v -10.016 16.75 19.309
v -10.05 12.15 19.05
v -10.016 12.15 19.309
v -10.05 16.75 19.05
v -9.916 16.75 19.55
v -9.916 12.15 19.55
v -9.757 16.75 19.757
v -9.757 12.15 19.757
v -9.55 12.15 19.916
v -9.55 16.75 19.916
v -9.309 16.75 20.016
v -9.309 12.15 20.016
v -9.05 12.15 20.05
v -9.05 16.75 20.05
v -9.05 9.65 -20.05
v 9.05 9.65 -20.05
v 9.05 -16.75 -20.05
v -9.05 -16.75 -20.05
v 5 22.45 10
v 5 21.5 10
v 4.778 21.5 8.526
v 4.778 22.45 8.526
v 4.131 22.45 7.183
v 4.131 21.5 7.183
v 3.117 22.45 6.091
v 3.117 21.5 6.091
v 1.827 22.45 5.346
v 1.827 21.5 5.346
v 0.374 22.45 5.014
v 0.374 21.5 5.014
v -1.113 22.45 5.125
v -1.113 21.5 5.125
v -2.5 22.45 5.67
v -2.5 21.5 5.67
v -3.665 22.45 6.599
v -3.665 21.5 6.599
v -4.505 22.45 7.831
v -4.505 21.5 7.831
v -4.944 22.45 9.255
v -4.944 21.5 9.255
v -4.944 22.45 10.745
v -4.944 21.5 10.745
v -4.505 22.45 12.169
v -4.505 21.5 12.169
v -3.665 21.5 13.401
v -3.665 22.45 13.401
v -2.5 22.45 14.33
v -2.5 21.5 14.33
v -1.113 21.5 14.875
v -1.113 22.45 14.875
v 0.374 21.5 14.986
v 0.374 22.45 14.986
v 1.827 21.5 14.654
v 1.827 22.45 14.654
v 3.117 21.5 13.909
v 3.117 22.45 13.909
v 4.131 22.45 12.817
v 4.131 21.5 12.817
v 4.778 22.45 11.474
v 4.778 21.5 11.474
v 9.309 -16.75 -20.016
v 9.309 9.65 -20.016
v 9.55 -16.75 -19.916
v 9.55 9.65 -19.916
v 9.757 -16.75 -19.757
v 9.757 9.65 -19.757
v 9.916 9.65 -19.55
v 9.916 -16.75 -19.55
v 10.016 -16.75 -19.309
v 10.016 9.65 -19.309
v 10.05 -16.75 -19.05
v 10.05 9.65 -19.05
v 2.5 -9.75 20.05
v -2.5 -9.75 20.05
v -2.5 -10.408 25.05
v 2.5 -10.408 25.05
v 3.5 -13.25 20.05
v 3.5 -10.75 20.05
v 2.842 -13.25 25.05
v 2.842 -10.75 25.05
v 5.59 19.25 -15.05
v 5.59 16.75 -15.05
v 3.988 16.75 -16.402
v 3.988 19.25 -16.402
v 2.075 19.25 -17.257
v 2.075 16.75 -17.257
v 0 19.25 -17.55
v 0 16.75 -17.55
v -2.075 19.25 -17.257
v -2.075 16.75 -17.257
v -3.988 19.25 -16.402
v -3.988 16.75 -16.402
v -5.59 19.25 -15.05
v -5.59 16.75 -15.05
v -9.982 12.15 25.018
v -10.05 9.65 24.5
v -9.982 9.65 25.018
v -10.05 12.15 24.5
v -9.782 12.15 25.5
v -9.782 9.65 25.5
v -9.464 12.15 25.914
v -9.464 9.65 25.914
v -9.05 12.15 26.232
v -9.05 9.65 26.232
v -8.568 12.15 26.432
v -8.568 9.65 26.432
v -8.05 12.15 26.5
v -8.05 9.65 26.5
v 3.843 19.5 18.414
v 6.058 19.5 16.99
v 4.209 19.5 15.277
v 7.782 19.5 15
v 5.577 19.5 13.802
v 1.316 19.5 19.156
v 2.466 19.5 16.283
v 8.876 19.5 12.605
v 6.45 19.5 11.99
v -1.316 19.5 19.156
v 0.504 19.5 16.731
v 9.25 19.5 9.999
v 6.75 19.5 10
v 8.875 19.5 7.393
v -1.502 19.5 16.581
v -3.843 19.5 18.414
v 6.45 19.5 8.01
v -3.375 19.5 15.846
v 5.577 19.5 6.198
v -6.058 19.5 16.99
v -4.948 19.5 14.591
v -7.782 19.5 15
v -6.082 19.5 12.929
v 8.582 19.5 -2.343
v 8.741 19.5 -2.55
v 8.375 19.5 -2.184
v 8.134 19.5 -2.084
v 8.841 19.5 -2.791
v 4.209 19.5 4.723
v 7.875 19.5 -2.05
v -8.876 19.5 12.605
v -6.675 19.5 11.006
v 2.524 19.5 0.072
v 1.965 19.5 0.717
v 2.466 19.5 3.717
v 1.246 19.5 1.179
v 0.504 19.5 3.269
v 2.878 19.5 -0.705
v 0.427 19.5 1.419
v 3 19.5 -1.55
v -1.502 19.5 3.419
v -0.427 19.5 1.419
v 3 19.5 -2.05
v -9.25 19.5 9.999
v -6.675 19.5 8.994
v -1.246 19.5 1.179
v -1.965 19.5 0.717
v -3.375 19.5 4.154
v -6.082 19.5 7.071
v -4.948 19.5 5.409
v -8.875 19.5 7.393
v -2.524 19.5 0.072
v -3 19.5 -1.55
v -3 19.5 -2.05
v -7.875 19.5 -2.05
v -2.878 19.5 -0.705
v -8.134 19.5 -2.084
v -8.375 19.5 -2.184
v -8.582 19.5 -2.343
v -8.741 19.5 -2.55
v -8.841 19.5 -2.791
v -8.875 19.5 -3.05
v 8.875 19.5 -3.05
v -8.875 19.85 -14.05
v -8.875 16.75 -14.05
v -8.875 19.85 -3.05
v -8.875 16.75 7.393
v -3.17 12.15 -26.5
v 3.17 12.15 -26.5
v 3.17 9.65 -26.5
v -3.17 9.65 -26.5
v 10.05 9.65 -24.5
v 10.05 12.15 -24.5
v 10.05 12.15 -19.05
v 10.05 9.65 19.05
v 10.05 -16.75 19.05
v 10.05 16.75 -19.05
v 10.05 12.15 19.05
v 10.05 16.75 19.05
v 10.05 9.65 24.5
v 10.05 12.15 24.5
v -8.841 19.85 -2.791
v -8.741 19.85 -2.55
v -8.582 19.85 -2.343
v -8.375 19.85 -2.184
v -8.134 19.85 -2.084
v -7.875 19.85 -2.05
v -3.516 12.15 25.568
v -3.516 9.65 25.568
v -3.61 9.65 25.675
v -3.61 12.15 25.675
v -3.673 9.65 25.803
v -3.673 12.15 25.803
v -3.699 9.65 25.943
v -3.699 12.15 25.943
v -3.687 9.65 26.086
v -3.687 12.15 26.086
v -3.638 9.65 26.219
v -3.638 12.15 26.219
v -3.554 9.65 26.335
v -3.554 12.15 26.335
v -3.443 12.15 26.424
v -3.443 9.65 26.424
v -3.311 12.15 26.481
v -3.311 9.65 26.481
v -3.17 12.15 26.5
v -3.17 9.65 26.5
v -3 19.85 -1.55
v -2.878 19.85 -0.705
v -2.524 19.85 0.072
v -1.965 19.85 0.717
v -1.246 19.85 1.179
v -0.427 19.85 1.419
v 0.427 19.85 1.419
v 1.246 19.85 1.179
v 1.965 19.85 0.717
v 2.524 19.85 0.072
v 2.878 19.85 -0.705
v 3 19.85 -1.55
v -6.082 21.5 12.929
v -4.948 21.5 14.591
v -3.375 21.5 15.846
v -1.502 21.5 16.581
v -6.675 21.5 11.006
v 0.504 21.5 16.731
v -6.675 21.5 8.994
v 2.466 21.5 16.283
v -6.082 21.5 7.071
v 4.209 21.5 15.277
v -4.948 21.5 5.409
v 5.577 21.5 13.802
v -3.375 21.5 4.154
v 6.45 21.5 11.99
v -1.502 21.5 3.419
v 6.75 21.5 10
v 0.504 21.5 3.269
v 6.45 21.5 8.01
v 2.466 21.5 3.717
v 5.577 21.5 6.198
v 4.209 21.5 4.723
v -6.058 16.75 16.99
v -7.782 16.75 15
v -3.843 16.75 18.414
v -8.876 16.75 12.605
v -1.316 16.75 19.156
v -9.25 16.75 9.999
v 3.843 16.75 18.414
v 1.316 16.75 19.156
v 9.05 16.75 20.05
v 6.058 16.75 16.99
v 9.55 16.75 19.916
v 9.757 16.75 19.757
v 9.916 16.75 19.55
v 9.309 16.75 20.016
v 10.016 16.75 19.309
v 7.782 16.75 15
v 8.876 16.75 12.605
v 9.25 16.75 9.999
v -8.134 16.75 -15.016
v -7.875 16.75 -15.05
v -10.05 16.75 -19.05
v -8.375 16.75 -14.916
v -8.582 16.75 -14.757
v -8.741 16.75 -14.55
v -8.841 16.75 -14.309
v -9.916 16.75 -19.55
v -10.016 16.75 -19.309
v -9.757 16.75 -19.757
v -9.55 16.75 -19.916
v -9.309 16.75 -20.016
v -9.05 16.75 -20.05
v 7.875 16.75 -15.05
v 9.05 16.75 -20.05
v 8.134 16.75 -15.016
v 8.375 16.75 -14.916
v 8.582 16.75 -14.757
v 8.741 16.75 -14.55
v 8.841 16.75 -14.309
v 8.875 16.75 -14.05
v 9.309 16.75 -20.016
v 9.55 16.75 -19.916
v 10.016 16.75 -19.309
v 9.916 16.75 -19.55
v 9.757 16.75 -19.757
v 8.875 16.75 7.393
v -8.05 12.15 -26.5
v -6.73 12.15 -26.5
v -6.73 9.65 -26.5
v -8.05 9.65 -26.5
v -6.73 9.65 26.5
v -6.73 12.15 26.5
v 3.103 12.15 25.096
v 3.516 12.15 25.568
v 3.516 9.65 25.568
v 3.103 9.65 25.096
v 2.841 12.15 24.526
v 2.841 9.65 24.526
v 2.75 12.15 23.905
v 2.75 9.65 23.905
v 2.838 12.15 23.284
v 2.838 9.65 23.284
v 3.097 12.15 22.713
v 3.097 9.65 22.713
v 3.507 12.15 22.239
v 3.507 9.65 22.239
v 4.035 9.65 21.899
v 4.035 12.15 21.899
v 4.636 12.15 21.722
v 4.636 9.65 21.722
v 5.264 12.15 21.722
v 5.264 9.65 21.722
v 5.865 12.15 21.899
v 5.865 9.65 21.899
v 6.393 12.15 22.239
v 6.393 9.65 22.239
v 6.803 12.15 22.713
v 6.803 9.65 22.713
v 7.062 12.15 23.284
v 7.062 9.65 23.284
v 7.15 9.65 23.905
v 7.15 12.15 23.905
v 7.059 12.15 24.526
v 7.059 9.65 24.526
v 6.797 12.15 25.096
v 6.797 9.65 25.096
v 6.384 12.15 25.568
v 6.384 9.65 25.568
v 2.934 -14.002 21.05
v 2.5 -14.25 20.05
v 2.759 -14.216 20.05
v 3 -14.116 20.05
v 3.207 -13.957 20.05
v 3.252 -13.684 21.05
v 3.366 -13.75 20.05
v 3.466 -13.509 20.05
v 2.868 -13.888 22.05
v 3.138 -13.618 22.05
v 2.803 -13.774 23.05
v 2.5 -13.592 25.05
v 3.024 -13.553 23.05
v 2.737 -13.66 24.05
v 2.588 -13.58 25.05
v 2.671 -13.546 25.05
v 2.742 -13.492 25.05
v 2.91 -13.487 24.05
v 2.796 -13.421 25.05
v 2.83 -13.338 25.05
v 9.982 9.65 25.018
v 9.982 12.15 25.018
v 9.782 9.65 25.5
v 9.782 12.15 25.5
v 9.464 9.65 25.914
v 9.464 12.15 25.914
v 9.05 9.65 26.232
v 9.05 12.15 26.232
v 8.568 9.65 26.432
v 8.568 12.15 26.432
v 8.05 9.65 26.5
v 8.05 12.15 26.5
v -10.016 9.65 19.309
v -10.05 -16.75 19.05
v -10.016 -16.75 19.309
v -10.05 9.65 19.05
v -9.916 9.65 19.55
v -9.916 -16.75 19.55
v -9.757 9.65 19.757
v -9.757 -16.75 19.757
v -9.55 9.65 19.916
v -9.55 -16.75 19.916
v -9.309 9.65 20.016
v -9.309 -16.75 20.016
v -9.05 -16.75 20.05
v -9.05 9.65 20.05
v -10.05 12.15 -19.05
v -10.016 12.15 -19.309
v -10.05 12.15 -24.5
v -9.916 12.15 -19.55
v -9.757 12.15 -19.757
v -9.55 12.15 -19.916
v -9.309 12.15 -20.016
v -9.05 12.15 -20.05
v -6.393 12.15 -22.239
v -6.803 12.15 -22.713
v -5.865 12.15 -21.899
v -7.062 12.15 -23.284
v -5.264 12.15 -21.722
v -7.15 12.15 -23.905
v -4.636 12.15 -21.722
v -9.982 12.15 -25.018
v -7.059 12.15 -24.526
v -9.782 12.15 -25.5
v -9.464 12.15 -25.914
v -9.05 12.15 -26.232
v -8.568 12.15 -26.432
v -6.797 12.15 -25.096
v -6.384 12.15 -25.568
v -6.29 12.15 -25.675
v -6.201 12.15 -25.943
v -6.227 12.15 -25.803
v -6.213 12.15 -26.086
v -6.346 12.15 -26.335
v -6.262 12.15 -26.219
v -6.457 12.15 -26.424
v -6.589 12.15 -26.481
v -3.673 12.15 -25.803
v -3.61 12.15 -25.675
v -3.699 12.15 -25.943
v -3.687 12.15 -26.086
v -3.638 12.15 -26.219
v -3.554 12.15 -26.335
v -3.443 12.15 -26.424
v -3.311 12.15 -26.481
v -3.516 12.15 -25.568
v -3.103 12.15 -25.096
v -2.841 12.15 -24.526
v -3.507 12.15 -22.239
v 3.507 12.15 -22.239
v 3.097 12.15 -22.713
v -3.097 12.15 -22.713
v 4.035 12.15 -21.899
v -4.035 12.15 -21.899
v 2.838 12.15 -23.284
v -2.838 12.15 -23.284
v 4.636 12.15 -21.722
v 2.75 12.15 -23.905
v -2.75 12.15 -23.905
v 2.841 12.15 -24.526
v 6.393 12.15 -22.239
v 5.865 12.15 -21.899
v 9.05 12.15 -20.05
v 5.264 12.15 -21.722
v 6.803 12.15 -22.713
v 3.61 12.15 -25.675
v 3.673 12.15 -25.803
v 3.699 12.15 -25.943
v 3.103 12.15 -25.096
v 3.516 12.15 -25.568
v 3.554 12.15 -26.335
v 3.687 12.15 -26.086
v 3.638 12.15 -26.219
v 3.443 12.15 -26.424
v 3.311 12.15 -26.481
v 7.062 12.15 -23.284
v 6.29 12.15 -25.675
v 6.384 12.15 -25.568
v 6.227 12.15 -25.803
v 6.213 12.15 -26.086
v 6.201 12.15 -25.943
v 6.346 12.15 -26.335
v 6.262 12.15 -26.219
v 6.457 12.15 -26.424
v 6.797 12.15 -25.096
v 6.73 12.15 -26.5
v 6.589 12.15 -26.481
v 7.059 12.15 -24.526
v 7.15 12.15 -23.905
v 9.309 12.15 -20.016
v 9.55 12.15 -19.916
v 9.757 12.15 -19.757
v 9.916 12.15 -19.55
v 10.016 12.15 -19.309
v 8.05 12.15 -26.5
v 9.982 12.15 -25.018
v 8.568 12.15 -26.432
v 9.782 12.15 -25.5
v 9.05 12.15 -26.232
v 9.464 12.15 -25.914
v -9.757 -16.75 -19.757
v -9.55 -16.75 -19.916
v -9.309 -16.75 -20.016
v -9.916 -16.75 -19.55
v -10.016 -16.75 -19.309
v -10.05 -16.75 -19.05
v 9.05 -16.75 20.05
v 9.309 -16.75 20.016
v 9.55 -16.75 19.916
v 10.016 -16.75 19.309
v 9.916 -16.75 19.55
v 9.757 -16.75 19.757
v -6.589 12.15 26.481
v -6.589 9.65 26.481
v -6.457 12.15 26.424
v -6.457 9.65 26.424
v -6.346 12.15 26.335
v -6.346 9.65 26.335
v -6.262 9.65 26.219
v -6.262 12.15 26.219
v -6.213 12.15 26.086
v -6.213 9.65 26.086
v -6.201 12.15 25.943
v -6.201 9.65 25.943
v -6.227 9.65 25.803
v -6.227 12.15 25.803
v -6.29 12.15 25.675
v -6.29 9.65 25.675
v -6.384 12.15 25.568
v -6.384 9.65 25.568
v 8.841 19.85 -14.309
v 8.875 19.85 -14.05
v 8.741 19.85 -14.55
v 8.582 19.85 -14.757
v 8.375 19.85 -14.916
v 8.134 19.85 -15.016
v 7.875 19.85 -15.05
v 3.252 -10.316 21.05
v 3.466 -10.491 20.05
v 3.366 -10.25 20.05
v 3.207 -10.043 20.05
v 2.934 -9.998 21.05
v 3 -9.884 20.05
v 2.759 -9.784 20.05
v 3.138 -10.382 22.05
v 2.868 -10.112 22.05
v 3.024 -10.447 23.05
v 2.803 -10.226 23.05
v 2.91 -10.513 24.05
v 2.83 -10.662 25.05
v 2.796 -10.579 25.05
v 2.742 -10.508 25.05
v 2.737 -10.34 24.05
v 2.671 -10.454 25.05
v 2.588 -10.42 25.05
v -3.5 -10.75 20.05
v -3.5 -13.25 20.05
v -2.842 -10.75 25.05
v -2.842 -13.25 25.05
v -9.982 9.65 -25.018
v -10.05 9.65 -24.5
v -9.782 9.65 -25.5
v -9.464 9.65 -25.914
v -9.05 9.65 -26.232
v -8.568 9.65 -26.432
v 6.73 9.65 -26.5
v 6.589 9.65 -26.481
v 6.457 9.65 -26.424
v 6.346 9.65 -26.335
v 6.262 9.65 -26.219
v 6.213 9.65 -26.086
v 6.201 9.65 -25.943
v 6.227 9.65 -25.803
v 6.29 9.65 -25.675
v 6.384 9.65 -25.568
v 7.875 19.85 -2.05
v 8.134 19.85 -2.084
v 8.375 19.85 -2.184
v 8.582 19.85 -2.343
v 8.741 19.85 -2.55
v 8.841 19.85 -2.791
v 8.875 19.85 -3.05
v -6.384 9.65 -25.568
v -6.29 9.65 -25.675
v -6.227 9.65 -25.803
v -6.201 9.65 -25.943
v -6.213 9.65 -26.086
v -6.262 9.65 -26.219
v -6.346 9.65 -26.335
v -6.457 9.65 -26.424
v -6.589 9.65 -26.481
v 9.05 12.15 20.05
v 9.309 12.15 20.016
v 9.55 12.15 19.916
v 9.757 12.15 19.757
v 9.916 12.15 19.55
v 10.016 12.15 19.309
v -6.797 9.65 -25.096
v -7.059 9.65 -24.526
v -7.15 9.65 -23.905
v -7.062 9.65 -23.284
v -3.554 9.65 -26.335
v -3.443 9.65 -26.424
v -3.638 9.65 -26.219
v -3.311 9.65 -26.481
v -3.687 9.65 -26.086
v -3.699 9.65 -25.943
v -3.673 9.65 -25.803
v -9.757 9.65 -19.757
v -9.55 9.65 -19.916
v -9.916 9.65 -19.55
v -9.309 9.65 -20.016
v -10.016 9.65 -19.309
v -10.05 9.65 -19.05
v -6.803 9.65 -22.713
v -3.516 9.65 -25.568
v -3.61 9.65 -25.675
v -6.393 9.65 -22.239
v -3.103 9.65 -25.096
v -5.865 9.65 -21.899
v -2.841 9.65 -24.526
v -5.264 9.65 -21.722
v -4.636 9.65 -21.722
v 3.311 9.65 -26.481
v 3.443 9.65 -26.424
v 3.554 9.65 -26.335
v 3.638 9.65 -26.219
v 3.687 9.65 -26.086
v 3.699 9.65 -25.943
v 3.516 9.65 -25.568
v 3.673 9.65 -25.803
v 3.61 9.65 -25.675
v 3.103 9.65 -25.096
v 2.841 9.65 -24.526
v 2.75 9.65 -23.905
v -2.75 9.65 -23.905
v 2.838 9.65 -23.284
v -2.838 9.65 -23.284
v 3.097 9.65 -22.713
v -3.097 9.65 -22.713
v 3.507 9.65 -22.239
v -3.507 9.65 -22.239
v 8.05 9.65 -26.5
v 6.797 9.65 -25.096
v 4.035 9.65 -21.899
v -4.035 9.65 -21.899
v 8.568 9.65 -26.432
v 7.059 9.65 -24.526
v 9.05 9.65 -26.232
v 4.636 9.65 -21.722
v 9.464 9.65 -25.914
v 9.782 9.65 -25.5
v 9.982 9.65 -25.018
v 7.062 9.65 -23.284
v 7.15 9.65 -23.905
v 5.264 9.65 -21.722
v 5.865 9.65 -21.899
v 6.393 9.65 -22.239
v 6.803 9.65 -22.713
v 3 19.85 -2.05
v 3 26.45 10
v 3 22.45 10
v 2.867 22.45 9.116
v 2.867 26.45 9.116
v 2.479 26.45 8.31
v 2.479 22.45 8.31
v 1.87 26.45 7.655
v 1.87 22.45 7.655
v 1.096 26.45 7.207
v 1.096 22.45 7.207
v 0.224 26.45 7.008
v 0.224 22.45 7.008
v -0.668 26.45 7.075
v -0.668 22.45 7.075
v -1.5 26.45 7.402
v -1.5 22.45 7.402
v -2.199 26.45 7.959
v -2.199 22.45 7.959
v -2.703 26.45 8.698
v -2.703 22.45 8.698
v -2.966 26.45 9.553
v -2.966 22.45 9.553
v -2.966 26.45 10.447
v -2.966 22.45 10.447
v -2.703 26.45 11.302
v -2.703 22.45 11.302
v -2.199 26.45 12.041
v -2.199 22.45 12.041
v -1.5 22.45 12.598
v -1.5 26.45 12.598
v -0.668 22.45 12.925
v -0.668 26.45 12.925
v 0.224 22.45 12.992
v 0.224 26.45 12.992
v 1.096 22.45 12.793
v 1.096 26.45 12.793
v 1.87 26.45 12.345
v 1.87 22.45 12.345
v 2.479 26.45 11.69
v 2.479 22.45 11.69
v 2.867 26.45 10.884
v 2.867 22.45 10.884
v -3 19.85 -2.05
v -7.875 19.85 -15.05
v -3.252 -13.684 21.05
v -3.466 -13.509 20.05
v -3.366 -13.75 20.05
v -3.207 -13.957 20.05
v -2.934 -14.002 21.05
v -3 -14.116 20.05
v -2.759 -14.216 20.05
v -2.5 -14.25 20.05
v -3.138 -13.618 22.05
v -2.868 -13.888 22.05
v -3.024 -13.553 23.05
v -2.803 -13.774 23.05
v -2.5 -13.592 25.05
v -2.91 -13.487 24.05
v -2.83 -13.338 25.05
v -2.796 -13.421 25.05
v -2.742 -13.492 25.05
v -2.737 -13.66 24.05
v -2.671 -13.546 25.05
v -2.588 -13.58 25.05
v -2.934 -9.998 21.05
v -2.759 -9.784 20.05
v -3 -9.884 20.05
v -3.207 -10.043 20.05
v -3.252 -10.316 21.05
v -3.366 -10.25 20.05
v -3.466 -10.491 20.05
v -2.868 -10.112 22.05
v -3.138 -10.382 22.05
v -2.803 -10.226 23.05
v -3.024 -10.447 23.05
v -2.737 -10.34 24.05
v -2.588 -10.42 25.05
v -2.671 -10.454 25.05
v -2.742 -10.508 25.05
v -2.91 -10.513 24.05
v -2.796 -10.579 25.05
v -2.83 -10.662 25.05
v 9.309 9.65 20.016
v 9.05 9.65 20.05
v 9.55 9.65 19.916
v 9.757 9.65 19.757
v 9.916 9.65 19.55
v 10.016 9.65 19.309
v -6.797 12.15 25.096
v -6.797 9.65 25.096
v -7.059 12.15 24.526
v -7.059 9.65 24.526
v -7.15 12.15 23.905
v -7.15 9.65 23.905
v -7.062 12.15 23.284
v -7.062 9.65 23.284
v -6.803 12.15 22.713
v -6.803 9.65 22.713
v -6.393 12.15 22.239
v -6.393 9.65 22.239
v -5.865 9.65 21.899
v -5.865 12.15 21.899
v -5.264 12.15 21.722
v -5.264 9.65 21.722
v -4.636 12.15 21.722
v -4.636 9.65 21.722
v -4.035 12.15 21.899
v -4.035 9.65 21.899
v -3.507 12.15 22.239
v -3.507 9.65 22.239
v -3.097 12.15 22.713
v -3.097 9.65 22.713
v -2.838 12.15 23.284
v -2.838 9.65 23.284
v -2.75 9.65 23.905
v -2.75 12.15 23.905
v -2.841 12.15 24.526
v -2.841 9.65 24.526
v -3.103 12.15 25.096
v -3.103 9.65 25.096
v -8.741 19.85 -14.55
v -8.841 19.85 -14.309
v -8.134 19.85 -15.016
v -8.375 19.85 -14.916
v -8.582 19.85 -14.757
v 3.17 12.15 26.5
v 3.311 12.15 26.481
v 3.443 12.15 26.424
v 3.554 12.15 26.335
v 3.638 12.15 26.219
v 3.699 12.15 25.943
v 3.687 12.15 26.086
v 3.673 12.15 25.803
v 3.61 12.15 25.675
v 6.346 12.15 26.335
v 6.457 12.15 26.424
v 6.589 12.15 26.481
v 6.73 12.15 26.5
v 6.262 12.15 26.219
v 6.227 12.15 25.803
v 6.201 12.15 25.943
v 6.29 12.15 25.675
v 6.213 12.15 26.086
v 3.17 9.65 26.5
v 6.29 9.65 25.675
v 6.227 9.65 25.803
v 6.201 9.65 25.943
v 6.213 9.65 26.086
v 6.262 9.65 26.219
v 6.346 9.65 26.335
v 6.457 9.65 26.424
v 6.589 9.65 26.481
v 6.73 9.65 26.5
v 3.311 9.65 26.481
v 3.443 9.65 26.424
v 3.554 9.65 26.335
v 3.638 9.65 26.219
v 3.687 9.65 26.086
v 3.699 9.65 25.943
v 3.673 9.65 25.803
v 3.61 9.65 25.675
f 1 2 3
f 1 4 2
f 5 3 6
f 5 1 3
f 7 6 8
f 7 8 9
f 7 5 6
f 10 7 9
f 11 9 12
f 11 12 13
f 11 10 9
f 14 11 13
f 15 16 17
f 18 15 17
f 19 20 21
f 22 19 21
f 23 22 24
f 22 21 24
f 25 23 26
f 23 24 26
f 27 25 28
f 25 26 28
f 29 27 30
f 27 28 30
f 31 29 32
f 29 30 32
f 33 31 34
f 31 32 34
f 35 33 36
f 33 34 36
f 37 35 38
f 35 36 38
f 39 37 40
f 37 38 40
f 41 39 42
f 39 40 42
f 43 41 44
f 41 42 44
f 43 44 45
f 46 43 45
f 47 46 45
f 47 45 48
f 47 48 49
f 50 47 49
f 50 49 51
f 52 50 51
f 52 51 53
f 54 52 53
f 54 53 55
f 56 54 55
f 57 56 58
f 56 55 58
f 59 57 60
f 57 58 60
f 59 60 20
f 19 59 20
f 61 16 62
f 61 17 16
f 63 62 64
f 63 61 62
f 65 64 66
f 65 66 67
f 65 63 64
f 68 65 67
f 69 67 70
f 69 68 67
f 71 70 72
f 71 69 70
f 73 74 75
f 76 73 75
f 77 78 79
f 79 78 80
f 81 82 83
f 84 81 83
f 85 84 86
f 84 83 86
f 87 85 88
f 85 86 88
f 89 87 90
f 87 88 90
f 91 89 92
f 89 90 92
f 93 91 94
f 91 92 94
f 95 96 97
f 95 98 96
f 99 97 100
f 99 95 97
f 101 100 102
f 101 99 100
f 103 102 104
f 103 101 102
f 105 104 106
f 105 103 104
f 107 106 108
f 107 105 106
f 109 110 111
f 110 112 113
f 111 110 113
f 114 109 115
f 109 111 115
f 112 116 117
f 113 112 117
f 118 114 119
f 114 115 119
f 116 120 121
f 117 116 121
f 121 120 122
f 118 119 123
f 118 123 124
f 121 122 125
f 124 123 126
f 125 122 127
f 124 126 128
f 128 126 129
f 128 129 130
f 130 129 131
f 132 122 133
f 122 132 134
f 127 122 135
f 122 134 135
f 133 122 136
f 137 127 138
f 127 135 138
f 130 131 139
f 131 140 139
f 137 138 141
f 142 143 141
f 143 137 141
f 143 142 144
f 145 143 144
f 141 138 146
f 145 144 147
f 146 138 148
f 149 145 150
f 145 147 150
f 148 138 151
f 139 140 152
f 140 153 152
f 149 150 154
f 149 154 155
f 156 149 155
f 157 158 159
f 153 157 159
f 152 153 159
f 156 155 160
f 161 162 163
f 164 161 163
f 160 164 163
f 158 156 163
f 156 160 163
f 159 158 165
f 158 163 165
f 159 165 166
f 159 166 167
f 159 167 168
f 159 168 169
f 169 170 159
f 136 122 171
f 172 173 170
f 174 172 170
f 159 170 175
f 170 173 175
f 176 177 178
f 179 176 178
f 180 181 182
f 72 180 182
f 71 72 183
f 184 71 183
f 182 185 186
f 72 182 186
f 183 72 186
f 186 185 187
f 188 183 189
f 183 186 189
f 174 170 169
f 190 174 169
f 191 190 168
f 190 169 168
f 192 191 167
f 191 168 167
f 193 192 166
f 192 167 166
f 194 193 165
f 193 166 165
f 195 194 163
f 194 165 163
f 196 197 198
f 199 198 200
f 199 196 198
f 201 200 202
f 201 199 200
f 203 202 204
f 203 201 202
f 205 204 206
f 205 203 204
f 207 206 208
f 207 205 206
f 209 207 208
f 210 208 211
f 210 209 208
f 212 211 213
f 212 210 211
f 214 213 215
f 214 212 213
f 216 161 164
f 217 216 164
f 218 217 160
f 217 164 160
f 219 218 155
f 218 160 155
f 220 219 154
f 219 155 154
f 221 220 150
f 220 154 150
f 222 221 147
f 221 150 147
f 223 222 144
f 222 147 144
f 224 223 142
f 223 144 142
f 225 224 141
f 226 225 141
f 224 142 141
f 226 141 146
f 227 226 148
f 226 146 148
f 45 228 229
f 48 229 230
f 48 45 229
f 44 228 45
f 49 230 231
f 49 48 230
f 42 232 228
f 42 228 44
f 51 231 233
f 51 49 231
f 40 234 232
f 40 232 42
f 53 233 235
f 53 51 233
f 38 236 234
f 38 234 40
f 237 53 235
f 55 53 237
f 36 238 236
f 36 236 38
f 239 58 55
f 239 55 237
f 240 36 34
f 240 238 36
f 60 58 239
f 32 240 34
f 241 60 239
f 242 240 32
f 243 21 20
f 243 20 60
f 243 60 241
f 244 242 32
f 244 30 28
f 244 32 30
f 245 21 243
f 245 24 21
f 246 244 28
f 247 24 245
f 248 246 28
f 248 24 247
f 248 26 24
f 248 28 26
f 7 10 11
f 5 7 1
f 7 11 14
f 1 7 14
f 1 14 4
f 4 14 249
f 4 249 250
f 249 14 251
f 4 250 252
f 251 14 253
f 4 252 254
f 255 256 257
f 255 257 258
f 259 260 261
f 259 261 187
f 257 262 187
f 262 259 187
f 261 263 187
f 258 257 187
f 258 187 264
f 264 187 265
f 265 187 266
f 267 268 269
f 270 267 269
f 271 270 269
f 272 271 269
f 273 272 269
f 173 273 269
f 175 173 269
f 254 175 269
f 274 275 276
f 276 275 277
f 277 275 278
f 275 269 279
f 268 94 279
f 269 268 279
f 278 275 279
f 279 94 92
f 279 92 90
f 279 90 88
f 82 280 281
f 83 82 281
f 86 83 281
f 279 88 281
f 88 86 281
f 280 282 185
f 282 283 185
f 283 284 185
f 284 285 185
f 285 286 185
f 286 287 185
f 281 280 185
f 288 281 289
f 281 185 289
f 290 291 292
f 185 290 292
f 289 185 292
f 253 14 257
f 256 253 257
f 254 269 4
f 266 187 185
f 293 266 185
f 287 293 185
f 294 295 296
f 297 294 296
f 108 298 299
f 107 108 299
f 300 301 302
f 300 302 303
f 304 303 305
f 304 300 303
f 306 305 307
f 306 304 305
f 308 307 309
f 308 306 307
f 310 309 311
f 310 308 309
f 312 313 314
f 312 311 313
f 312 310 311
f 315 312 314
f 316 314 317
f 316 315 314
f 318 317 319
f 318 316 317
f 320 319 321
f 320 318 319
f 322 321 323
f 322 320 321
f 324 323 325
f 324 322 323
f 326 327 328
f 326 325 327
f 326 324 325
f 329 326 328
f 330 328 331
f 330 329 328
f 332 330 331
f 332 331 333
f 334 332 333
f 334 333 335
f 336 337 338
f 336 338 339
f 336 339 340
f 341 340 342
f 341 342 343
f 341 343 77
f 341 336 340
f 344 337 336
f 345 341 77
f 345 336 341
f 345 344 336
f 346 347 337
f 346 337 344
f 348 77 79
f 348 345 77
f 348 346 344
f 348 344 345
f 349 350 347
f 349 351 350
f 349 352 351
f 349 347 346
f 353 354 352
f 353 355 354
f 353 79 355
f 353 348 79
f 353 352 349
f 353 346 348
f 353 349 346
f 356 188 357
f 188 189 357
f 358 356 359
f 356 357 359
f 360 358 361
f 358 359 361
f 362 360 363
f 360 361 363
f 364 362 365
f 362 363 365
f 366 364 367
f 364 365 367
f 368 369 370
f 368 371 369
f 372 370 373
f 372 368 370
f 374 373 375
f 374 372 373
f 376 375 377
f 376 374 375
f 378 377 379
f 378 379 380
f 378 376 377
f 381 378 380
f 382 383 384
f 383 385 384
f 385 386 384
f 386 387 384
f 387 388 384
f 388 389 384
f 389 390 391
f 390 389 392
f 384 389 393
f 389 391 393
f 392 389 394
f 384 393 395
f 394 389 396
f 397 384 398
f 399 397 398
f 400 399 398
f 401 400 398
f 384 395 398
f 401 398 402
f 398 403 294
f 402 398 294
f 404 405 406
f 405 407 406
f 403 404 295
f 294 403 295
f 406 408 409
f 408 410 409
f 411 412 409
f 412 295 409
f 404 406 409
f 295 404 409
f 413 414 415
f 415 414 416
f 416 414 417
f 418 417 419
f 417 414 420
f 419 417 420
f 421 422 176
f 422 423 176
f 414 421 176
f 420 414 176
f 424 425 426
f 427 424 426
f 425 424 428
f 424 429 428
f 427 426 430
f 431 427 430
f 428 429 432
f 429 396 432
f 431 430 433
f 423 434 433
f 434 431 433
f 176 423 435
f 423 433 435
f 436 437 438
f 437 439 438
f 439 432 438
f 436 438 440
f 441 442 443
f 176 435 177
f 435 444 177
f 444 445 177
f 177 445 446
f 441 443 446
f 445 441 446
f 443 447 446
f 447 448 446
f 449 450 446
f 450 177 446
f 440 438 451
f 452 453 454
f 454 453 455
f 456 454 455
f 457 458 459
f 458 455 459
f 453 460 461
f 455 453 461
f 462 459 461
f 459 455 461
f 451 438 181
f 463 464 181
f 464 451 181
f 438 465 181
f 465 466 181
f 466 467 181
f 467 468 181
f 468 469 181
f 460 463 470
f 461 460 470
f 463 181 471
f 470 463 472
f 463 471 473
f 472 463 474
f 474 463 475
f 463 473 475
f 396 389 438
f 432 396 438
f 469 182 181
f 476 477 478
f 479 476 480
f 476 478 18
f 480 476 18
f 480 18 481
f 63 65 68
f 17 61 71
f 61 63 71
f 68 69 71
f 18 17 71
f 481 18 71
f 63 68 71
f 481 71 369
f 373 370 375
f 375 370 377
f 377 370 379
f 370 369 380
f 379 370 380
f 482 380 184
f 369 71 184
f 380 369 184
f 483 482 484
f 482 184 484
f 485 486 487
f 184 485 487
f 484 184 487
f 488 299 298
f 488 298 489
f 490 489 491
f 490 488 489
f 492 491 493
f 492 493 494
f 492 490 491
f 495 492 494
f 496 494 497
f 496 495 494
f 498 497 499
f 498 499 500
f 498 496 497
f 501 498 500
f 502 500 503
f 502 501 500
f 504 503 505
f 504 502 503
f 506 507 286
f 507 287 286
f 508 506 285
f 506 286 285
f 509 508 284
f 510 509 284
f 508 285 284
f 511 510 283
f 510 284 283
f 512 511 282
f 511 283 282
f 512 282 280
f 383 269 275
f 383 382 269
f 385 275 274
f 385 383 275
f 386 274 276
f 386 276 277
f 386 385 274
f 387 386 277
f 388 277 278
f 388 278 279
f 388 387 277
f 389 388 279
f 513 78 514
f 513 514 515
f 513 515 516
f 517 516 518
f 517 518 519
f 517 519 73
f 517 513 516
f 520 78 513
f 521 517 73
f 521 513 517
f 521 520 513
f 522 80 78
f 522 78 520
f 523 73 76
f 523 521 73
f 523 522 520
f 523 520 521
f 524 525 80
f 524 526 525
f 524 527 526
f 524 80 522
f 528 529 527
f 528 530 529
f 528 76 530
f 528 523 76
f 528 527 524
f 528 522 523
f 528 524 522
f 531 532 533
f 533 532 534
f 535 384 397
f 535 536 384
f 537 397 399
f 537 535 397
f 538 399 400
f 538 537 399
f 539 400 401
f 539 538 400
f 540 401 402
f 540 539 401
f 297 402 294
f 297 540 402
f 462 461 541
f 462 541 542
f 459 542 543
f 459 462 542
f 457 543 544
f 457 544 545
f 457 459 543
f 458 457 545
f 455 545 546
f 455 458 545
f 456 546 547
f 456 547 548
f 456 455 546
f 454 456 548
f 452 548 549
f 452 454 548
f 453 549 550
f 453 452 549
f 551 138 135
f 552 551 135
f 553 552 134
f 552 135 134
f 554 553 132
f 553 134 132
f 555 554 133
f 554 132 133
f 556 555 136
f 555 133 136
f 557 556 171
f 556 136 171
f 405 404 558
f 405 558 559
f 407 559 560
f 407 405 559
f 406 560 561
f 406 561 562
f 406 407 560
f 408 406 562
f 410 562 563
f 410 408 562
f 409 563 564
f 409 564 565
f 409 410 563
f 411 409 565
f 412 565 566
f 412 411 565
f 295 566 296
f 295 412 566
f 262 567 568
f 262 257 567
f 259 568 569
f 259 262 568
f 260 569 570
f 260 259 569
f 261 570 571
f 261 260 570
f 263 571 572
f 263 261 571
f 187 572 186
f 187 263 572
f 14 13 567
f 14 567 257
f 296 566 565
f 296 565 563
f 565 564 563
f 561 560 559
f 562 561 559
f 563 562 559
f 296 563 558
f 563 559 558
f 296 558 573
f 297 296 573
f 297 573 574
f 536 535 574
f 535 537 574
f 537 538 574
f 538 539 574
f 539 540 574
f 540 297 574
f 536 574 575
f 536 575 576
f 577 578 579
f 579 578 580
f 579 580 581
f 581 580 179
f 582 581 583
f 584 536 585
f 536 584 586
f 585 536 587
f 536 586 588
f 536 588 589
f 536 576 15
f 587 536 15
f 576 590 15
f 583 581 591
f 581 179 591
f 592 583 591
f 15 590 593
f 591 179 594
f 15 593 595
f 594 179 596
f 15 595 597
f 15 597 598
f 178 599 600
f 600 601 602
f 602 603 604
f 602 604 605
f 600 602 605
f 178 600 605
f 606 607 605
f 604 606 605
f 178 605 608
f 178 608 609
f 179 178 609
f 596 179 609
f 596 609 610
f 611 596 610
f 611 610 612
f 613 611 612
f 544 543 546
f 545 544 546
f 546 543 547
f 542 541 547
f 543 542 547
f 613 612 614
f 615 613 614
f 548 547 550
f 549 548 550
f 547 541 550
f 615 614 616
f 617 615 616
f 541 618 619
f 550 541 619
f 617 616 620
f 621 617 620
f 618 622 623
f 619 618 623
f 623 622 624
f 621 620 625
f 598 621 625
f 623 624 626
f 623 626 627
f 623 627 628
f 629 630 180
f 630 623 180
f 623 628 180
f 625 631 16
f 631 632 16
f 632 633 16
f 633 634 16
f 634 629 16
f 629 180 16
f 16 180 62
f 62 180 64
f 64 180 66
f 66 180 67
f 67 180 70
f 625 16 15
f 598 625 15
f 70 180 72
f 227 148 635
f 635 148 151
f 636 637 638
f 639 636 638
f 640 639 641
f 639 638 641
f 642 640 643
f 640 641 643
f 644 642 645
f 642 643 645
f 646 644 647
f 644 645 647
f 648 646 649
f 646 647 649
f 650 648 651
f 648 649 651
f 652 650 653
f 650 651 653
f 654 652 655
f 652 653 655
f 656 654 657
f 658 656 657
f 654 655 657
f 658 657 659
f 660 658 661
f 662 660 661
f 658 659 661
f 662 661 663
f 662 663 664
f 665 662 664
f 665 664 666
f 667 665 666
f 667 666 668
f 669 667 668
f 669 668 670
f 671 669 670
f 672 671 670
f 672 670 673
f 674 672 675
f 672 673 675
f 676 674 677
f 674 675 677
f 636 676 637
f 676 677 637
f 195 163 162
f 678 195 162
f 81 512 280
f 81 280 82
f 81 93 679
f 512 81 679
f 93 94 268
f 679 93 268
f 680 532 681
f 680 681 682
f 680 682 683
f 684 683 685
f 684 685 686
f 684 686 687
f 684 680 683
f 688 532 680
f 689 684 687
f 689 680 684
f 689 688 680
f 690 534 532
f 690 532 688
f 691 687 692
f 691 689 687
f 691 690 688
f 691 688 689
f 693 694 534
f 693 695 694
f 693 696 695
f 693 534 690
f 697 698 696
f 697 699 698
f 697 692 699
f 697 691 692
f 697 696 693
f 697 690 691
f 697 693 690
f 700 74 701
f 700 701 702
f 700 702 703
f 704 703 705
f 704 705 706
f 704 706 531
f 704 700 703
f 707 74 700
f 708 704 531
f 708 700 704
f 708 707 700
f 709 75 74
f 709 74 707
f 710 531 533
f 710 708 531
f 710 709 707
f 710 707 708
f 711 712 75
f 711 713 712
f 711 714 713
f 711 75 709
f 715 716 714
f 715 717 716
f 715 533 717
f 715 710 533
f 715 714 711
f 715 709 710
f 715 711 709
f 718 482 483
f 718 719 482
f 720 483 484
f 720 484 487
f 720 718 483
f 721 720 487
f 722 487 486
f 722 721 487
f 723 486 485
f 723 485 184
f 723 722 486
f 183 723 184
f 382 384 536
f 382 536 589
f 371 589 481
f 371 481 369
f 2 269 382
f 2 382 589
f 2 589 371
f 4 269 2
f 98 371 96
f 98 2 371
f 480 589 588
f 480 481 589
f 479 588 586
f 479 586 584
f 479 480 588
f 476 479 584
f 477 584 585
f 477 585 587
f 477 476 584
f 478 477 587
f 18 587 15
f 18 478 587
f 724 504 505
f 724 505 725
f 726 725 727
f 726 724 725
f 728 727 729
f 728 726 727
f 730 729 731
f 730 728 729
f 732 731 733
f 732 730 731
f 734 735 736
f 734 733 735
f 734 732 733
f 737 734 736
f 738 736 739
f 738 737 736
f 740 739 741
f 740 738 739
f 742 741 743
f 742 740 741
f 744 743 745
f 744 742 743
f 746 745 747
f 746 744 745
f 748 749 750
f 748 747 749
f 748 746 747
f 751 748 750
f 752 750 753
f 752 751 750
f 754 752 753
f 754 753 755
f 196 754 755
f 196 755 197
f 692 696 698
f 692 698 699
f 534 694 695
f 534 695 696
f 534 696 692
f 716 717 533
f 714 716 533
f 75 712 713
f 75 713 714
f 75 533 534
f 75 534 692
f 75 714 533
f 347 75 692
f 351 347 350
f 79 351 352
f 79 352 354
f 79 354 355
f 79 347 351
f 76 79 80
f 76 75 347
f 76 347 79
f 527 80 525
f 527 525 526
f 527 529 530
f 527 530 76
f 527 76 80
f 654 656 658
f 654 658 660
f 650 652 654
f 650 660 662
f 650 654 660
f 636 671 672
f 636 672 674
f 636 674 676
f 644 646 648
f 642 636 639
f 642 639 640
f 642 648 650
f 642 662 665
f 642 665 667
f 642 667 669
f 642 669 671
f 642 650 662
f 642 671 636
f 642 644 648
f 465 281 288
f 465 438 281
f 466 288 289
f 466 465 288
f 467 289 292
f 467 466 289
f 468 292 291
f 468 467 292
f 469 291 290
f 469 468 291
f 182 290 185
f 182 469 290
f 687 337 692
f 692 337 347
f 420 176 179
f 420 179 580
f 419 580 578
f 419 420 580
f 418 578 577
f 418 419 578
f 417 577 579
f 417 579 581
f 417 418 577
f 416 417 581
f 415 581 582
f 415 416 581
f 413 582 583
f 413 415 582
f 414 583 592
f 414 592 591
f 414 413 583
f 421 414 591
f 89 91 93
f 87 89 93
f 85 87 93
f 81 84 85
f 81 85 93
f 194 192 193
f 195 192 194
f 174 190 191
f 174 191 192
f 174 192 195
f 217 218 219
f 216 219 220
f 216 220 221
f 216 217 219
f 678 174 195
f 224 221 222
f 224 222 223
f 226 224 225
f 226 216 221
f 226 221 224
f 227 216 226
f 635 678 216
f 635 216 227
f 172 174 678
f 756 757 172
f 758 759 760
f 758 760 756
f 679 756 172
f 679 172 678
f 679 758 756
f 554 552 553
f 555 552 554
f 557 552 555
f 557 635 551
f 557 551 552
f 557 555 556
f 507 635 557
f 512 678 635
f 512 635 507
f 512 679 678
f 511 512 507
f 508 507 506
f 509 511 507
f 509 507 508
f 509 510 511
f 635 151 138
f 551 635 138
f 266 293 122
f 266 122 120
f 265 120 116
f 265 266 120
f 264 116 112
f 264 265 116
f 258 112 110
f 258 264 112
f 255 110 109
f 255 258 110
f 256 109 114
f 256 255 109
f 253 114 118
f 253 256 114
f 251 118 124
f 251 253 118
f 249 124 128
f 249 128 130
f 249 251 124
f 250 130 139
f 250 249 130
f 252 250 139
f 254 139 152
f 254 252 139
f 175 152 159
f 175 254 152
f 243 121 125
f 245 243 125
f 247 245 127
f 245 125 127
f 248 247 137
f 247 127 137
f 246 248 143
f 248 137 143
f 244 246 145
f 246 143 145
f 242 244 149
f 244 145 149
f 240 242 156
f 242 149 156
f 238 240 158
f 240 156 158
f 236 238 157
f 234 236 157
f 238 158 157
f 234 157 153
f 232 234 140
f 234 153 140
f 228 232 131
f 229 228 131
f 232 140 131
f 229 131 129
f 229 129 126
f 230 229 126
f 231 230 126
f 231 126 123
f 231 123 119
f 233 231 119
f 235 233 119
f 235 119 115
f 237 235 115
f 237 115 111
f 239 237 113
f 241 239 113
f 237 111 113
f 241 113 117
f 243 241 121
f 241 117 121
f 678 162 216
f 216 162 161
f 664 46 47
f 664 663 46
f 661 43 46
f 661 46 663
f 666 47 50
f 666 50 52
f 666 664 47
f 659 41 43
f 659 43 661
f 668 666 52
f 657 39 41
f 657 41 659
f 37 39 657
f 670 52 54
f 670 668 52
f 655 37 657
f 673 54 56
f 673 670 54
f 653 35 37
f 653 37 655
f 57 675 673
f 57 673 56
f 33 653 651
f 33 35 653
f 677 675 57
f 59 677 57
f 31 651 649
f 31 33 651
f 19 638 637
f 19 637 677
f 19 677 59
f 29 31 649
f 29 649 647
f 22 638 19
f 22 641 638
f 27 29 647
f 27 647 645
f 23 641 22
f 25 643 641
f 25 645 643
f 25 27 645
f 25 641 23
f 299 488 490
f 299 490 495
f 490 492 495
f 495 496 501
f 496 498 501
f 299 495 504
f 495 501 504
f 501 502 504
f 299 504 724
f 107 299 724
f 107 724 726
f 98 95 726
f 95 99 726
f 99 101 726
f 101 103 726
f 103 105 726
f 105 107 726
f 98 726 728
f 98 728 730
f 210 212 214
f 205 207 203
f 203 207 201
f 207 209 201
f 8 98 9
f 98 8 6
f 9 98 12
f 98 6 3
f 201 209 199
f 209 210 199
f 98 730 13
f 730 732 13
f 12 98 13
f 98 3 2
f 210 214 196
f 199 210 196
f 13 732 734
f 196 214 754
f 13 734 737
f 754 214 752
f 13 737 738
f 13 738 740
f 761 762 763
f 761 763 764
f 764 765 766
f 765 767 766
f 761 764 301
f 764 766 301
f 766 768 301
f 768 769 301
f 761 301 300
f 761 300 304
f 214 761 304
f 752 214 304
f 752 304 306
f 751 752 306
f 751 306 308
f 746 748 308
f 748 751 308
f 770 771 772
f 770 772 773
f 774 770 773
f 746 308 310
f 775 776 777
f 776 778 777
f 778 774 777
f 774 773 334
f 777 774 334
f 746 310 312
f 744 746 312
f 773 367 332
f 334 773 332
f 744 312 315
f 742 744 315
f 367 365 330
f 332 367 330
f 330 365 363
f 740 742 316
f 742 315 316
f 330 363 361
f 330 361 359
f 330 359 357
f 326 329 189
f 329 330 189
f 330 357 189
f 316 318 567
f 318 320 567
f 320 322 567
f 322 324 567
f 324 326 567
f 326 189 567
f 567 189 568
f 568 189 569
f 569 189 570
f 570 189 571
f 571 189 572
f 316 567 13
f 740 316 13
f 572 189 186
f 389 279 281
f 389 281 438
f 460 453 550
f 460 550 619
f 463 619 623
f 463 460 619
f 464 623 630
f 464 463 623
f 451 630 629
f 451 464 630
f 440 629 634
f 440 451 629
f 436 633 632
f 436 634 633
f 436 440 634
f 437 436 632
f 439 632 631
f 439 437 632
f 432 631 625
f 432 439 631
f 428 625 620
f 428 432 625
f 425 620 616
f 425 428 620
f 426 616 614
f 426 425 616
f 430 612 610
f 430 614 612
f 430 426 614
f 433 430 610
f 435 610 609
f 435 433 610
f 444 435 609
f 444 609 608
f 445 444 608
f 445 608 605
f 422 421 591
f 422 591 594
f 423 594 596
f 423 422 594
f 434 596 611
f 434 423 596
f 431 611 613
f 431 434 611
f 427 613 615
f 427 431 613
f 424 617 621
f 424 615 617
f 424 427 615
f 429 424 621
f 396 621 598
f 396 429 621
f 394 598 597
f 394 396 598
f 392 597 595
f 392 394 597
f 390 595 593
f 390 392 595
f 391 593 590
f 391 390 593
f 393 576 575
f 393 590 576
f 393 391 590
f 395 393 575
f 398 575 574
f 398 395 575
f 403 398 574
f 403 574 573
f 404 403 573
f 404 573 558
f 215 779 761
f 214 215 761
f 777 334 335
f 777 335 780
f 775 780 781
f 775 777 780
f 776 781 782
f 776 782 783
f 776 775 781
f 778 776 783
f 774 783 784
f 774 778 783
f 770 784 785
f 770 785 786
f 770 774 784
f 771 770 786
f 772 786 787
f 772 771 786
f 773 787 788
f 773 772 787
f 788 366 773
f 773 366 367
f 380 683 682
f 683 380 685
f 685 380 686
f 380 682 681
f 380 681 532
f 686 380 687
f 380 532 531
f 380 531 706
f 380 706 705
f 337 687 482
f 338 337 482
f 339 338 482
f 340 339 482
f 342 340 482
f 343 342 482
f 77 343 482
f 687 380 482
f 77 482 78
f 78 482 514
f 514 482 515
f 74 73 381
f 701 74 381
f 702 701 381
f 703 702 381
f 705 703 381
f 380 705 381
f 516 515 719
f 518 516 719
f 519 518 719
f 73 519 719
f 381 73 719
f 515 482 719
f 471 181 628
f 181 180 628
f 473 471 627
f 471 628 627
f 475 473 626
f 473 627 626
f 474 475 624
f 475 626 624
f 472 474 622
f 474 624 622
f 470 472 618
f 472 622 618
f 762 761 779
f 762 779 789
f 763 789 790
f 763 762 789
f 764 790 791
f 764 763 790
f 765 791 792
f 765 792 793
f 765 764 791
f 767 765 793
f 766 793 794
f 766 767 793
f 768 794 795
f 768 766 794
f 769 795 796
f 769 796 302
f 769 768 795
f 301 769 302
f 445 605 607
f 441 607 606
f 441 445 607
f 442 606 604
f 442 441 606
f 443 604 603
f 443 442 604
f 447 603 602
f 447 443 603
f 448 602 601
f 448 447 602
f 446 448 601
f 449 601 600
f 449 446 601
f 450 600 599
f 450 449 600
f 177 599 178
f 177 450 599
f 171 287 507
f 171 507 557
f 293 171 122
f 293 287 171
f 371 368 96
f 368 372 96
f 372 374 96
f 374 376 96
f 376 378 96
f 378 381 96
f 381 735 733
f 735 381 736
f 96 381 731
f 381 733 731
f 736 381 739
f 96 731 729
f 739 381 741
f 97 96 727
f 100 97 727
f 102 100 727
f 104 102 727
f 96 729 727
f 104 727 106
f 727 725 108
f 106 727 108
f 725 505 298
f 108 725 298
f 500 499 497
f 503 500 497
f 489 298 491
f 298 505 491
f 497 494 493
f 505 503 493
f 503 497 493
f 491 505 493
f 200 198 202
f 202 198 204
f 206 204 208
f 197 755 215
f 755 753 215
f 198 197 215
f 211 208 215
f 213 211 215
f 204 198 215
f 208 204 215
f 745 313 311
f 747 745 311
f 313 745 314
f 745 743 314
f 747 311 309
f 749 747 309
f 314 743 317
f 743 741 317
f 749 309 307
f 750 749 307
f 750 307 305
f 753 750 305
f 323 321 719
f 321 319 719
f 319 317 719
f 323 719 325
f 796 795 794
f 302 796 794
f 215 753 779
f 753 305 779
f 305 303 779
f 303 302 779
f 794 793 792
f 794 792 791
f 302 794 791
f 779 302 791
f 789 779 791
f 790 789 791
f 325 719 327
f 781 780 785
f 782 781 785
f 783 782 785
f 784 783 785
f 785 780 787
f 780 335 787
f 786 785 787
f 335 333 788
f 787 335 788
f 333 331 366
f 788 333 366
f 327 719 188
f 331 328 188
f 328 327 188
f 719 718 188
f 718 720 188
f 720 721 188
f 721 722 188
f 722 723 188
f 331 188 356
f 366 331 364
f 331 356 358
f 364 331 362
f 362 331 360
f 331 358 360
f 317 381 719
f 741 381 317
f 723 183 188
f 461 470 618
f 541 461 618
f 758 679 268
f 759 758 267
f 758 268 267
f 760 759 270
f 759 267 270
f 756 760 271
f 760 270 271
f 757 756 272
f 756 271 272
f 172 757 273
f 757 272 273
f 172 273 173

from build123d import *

# Parameters (mm, degrees)
BOSS_EXTRUDE1_DEPTH = 10.05
BOSS_EXTRUDE2_DEPTH = 2.75
SKETCH3_R           = 7.5
BOSS_EXTRUDE3_DEPTH = 2.5
SKETCH4_R           = 6.75
BOSS_EXTRUDE4_DEPTH = 2
SKETCH5_R           = 5
BOSS_EXTRUDE5_DEPTH = 0.95
SKETCH6_R           = 3
SERVO_SPLINE_DEPTH  = 4
FILLET1_R           = 1
BOSS_EXTRUDE7_DEPTH = 0.35
CUT_EXTRUDE1_DEPTH  = 29.9
FILLET2_R           = 2
FILLET3_R           = 1
BOSS_EXTRUDE8_DEPTH = 5
BOSS_EXTRUDE8_TAPER = 7.5


with BuildPart() as part:
    # Sketch1 → Boss-Extrude1 (new body, symmetric)
    with BuildSketch(Plane(origin=(0, 0, 0), x_dir=(0, 0, -1), z_dir=(1, 0, 0))):
        Polygon((-20.05, 16.75), (20.05, 16.75), (20.05, 12.15), (26.5, 12.15), (26.5, 9.65), (20.05, 9.65), (20.05, -16.75), (-20.05, -16.75), (-20.05, 9.65), (-26.5, 9.65), (-26.5, 12.15), (-20.05, 12.15), align=None)
    extrude(amount=BOSS_EXTRUDE1_DEPTH, both=True)

    # Sketch2 → Boss-Extrude2 (add)
    with BuildSketch(Plane(origin=(0, 16.75, 0), x_dir=(1, 0, 0), z_dir=(0, 1, 0))):
        with BuildLine():
            Line((-8.875, 15.05), (8.875, 15.05))
            Line((8.875, 15.05), (8.875, -7.392918298))
            ThreePointArc((8.875, -7.392918298), (0, -19.25), (-8.875, -7.392918298))
            Line((-8.875, -7.392918298), (-8.875, 15.05))
        make_face()
    extrude(amount=BOSS_EXTRUDE2_DEPTH)

    # Sketch3 → Boss-Extrude3 (add)
    with BuildSketch(Plane(origin=(0, 16.75, 0), x_dir=(1, 0, 0), z_dir=(0, 1, 0))):
        with Locations((0, 10.05)):
            Circle(SKETCH3_R)
    extrude(amount=BOSS_EXTRUDE3_DEPTH)

    # Sketch4 → Boss-Extrude4 (add)
    with BuildSketch(Plane(origin=(0, 19.5, 0), x_dir=(1, 0, 0), z_dir=(0, 1, 0))):
        with Locations((0, -10)):
            Circle(SKETCH4_R)
    extrude(amount=BOSS_EXTRUDE4_DEPTH)

    # Sketch5 → Boss-Extrude5 (add)
    with BuildSketch(Plane(origin=(0, 21.5, 0), x_dir=(1, 0, 0), z_dir=(0, 1, 0))):
        with Locations((0, -10)):
            Circle(SKETCH5_R)
    extrude(amount=BOSS_EXTRUDE5_DEPTH)

    # Sketch6 → Servo Spline (add)
    with BuildSketch(Plane(origin=(0, 22.45, 0), x_dir=(1, 0, 0), z_dir=(0, 1, 0))):
        with Locations((0, -10)):
            Circle(SKETCH6_R)
    extrude(amount=SERVO_SPLINE_DEPTH)

    # Fillet1
    fillet1_edges = [part.edges().sort_by_distance(p)[0] for p in [
        (-8.875, 18.125, -15.05),
        (8.875, 18.125, -15.05),
    ]]
    fillet(fillet1_edges, radius=FILLET1_R)

    # Sketch7 → Boss-Extrude7 (add)
    with BuildSketch(Plane(origin=(0, 19.5, 0), x_dir=(1, 0, 0), z_dir=(0, 1, 0))):
        with BuildLine():
            Line((-7.875, 2.05), (-3, 2.05))
            Line((-3, 2.05), (-3, 1.55))
            ThreePointArc((-3, 1.55), (0, -1.45), (3, 1.55))
            Line((3, 1.55), (3, 2.05))
            Line((3, 2.05), (7.875, 2.05))
            ThreePointArc((7.875, 2.05), (8.582106781, 2.342893219), (8.875, 3.05))
            Line((8.875, 3.05), (8.875, 14.05))
            ThreePointArc((8.875, 14.05), (8.582106781, 14.757106781), (7.875, 15.05))
            Line((7.875, 15.05), (-7.875, 15.05))
            ThreePointArc((-7.875, 15.05), (-8.582106781, 14.757106781), (-8.875, 14.05))
            Line((-8.875, 14.05), (-8.875, 3.05))
            ThreePointArc((-8.875, 3.05), (-8.582106781, 2.342893219), (-7.875, 2.05))
        make_face()
    extrude(amount=BOSS_EXTRUDE7_DEPTH)

    # Sketch8 → Cut-Extrude1 (cut, through all)
    with BuildSketch(Plane(origin=(0, 12.15, 0), x_dir=(1, 0, 0), z_dir=(0, 1, 0))):
        with BuildLine():
            Line((6.730066226, -26.5), (3.169933774, -26.5))
            ThreePointArc((3.169933774, -26.5), (3.666925505, -26.154241731), (3.515549194, -25.568038035))
            ThreePointArc((3.515549194, -25.568038035), (4.95, -21.7), (6.384450806, -25.568038035))
            ThreePointArc((6.384450806, -25.568038035), (6.233074495, -26.154241731), (6.730066226, -26.5))
        make_face()
        with BuildLine():
            Line((-3.169933774, -26.5), (-6.730066226, -26.5))
            ThreePointArc((-6.730066226, -26.5), (-6.233074495, -26.154241731), (-6.384450806, -25.568038035))
            ThreePointArc((-6.384450806, -25.568038035), (-4.95, -21.7), (-3.515549194, -25.568038035))
            ThreePointArc((-3.515549194, -25.568038035), (-3.666925505, -26.154241731), (-3.169933774, -26.5))
        make_face()
        with BuildLine():
            Line((-6.730066226, 26.5), (-3.169933774, 26.5))
            ThreePointArc((-3.169933774, 26.5), (-3.666925505, 26.154241731), (-3.515549194, 25.568038035))
            ThreePointArc((-3.515549194, 25.568038035), (-4.95, 21.7), (-6.384450806, 25.568038035))
            ThreePointArc((-6.384450806, 25.568038035), (-6.233074495, 26.154241731), (-6.730066226, 26.5))
        make_face()
        with BuildLine():
            Line((3.169933774, 26.5), (6.730066226, 26.5))
            ThreePointArc((6.730066226, 26.5), (6.233074495, 26.154241731), (6.384450806, 25.568038035))
            ThreePointArc((6.384450806, 25.568038035), (4.95, 21.7), (3.515549194, 25.568038035))
            ThreePointArc((3.515549194, 25.568038035), (3.666925505, 26.154241731), (3.169933774, 26.5))
        make_face()
    extrude(amount=-CUT_EXTRUDE1_DEPTH, mode=Mode.SUBTRACT)

    # Fillet2
    fillet2_edges = [part.edges().sort_by_distance(p)[0] for p in [
        (10.05, 10.9, 26.5),
        (-10.05, 10.9, -26.5),
        (-10.05, 10.9, 26.5),
        (10.05, 10.9, -26.5),
    ]]
    fillet(fillet2_edges, radius=FILLET2_R)

    # Fillet3
    fillet3_edges = [part.edges().sort_by_distance(p)[0] for p in [
        (-10.05, 14.45, -20.05),
        (-10.05, -3.55, -20.05),
        (-10.05, -3.55, 20.05),
        (-10.05, 14.45, 20.05),
        (10.05, -3.55, 20.05),
        (10.05, -3.55, -20.05),
        (10.05, 14.45, -20.05),
        (10.05, 14.45, 20.05),
    ]]
    fillet(fillet3_edges, radius=FILLET3_R)

    # Sketch9 → Boss-Extrude8 (add)
    with BuildSketch(Plane.XY.offset(20.05)):
        with BuildLine():
            Line((-2.5, -14.25), (2.5, -14.25))
            ThreePointArc((2.5, -14.25), (3.207106781, -13.957106781), (3.5, -13.25))
            Line((3.5, -13.25), (3.5, -10.75))
            ThreePointArc((3.5, -10.75), (3.207106781, -10.042893219), (2.5, -9.75))
            Line((2.5, -9.75), (-2.5, -9.75))
            ThreePointArc((-2.5, -9.75), (-3.207106781, -10.042893219), (-3.5, -10.75))
            Line((-3.5, -10.75), (-3.5, -13.25))
            ThreePointArc((-3.5, -13.25), (-3.207106781, -13.957106781), (-2.5, -14.25))
        make_face()
    extrude(amount=BOSS_EXTRUDE8_DEPTH, taper=BOSS_EXTRUDE8_TAPER)


solid = part.part
